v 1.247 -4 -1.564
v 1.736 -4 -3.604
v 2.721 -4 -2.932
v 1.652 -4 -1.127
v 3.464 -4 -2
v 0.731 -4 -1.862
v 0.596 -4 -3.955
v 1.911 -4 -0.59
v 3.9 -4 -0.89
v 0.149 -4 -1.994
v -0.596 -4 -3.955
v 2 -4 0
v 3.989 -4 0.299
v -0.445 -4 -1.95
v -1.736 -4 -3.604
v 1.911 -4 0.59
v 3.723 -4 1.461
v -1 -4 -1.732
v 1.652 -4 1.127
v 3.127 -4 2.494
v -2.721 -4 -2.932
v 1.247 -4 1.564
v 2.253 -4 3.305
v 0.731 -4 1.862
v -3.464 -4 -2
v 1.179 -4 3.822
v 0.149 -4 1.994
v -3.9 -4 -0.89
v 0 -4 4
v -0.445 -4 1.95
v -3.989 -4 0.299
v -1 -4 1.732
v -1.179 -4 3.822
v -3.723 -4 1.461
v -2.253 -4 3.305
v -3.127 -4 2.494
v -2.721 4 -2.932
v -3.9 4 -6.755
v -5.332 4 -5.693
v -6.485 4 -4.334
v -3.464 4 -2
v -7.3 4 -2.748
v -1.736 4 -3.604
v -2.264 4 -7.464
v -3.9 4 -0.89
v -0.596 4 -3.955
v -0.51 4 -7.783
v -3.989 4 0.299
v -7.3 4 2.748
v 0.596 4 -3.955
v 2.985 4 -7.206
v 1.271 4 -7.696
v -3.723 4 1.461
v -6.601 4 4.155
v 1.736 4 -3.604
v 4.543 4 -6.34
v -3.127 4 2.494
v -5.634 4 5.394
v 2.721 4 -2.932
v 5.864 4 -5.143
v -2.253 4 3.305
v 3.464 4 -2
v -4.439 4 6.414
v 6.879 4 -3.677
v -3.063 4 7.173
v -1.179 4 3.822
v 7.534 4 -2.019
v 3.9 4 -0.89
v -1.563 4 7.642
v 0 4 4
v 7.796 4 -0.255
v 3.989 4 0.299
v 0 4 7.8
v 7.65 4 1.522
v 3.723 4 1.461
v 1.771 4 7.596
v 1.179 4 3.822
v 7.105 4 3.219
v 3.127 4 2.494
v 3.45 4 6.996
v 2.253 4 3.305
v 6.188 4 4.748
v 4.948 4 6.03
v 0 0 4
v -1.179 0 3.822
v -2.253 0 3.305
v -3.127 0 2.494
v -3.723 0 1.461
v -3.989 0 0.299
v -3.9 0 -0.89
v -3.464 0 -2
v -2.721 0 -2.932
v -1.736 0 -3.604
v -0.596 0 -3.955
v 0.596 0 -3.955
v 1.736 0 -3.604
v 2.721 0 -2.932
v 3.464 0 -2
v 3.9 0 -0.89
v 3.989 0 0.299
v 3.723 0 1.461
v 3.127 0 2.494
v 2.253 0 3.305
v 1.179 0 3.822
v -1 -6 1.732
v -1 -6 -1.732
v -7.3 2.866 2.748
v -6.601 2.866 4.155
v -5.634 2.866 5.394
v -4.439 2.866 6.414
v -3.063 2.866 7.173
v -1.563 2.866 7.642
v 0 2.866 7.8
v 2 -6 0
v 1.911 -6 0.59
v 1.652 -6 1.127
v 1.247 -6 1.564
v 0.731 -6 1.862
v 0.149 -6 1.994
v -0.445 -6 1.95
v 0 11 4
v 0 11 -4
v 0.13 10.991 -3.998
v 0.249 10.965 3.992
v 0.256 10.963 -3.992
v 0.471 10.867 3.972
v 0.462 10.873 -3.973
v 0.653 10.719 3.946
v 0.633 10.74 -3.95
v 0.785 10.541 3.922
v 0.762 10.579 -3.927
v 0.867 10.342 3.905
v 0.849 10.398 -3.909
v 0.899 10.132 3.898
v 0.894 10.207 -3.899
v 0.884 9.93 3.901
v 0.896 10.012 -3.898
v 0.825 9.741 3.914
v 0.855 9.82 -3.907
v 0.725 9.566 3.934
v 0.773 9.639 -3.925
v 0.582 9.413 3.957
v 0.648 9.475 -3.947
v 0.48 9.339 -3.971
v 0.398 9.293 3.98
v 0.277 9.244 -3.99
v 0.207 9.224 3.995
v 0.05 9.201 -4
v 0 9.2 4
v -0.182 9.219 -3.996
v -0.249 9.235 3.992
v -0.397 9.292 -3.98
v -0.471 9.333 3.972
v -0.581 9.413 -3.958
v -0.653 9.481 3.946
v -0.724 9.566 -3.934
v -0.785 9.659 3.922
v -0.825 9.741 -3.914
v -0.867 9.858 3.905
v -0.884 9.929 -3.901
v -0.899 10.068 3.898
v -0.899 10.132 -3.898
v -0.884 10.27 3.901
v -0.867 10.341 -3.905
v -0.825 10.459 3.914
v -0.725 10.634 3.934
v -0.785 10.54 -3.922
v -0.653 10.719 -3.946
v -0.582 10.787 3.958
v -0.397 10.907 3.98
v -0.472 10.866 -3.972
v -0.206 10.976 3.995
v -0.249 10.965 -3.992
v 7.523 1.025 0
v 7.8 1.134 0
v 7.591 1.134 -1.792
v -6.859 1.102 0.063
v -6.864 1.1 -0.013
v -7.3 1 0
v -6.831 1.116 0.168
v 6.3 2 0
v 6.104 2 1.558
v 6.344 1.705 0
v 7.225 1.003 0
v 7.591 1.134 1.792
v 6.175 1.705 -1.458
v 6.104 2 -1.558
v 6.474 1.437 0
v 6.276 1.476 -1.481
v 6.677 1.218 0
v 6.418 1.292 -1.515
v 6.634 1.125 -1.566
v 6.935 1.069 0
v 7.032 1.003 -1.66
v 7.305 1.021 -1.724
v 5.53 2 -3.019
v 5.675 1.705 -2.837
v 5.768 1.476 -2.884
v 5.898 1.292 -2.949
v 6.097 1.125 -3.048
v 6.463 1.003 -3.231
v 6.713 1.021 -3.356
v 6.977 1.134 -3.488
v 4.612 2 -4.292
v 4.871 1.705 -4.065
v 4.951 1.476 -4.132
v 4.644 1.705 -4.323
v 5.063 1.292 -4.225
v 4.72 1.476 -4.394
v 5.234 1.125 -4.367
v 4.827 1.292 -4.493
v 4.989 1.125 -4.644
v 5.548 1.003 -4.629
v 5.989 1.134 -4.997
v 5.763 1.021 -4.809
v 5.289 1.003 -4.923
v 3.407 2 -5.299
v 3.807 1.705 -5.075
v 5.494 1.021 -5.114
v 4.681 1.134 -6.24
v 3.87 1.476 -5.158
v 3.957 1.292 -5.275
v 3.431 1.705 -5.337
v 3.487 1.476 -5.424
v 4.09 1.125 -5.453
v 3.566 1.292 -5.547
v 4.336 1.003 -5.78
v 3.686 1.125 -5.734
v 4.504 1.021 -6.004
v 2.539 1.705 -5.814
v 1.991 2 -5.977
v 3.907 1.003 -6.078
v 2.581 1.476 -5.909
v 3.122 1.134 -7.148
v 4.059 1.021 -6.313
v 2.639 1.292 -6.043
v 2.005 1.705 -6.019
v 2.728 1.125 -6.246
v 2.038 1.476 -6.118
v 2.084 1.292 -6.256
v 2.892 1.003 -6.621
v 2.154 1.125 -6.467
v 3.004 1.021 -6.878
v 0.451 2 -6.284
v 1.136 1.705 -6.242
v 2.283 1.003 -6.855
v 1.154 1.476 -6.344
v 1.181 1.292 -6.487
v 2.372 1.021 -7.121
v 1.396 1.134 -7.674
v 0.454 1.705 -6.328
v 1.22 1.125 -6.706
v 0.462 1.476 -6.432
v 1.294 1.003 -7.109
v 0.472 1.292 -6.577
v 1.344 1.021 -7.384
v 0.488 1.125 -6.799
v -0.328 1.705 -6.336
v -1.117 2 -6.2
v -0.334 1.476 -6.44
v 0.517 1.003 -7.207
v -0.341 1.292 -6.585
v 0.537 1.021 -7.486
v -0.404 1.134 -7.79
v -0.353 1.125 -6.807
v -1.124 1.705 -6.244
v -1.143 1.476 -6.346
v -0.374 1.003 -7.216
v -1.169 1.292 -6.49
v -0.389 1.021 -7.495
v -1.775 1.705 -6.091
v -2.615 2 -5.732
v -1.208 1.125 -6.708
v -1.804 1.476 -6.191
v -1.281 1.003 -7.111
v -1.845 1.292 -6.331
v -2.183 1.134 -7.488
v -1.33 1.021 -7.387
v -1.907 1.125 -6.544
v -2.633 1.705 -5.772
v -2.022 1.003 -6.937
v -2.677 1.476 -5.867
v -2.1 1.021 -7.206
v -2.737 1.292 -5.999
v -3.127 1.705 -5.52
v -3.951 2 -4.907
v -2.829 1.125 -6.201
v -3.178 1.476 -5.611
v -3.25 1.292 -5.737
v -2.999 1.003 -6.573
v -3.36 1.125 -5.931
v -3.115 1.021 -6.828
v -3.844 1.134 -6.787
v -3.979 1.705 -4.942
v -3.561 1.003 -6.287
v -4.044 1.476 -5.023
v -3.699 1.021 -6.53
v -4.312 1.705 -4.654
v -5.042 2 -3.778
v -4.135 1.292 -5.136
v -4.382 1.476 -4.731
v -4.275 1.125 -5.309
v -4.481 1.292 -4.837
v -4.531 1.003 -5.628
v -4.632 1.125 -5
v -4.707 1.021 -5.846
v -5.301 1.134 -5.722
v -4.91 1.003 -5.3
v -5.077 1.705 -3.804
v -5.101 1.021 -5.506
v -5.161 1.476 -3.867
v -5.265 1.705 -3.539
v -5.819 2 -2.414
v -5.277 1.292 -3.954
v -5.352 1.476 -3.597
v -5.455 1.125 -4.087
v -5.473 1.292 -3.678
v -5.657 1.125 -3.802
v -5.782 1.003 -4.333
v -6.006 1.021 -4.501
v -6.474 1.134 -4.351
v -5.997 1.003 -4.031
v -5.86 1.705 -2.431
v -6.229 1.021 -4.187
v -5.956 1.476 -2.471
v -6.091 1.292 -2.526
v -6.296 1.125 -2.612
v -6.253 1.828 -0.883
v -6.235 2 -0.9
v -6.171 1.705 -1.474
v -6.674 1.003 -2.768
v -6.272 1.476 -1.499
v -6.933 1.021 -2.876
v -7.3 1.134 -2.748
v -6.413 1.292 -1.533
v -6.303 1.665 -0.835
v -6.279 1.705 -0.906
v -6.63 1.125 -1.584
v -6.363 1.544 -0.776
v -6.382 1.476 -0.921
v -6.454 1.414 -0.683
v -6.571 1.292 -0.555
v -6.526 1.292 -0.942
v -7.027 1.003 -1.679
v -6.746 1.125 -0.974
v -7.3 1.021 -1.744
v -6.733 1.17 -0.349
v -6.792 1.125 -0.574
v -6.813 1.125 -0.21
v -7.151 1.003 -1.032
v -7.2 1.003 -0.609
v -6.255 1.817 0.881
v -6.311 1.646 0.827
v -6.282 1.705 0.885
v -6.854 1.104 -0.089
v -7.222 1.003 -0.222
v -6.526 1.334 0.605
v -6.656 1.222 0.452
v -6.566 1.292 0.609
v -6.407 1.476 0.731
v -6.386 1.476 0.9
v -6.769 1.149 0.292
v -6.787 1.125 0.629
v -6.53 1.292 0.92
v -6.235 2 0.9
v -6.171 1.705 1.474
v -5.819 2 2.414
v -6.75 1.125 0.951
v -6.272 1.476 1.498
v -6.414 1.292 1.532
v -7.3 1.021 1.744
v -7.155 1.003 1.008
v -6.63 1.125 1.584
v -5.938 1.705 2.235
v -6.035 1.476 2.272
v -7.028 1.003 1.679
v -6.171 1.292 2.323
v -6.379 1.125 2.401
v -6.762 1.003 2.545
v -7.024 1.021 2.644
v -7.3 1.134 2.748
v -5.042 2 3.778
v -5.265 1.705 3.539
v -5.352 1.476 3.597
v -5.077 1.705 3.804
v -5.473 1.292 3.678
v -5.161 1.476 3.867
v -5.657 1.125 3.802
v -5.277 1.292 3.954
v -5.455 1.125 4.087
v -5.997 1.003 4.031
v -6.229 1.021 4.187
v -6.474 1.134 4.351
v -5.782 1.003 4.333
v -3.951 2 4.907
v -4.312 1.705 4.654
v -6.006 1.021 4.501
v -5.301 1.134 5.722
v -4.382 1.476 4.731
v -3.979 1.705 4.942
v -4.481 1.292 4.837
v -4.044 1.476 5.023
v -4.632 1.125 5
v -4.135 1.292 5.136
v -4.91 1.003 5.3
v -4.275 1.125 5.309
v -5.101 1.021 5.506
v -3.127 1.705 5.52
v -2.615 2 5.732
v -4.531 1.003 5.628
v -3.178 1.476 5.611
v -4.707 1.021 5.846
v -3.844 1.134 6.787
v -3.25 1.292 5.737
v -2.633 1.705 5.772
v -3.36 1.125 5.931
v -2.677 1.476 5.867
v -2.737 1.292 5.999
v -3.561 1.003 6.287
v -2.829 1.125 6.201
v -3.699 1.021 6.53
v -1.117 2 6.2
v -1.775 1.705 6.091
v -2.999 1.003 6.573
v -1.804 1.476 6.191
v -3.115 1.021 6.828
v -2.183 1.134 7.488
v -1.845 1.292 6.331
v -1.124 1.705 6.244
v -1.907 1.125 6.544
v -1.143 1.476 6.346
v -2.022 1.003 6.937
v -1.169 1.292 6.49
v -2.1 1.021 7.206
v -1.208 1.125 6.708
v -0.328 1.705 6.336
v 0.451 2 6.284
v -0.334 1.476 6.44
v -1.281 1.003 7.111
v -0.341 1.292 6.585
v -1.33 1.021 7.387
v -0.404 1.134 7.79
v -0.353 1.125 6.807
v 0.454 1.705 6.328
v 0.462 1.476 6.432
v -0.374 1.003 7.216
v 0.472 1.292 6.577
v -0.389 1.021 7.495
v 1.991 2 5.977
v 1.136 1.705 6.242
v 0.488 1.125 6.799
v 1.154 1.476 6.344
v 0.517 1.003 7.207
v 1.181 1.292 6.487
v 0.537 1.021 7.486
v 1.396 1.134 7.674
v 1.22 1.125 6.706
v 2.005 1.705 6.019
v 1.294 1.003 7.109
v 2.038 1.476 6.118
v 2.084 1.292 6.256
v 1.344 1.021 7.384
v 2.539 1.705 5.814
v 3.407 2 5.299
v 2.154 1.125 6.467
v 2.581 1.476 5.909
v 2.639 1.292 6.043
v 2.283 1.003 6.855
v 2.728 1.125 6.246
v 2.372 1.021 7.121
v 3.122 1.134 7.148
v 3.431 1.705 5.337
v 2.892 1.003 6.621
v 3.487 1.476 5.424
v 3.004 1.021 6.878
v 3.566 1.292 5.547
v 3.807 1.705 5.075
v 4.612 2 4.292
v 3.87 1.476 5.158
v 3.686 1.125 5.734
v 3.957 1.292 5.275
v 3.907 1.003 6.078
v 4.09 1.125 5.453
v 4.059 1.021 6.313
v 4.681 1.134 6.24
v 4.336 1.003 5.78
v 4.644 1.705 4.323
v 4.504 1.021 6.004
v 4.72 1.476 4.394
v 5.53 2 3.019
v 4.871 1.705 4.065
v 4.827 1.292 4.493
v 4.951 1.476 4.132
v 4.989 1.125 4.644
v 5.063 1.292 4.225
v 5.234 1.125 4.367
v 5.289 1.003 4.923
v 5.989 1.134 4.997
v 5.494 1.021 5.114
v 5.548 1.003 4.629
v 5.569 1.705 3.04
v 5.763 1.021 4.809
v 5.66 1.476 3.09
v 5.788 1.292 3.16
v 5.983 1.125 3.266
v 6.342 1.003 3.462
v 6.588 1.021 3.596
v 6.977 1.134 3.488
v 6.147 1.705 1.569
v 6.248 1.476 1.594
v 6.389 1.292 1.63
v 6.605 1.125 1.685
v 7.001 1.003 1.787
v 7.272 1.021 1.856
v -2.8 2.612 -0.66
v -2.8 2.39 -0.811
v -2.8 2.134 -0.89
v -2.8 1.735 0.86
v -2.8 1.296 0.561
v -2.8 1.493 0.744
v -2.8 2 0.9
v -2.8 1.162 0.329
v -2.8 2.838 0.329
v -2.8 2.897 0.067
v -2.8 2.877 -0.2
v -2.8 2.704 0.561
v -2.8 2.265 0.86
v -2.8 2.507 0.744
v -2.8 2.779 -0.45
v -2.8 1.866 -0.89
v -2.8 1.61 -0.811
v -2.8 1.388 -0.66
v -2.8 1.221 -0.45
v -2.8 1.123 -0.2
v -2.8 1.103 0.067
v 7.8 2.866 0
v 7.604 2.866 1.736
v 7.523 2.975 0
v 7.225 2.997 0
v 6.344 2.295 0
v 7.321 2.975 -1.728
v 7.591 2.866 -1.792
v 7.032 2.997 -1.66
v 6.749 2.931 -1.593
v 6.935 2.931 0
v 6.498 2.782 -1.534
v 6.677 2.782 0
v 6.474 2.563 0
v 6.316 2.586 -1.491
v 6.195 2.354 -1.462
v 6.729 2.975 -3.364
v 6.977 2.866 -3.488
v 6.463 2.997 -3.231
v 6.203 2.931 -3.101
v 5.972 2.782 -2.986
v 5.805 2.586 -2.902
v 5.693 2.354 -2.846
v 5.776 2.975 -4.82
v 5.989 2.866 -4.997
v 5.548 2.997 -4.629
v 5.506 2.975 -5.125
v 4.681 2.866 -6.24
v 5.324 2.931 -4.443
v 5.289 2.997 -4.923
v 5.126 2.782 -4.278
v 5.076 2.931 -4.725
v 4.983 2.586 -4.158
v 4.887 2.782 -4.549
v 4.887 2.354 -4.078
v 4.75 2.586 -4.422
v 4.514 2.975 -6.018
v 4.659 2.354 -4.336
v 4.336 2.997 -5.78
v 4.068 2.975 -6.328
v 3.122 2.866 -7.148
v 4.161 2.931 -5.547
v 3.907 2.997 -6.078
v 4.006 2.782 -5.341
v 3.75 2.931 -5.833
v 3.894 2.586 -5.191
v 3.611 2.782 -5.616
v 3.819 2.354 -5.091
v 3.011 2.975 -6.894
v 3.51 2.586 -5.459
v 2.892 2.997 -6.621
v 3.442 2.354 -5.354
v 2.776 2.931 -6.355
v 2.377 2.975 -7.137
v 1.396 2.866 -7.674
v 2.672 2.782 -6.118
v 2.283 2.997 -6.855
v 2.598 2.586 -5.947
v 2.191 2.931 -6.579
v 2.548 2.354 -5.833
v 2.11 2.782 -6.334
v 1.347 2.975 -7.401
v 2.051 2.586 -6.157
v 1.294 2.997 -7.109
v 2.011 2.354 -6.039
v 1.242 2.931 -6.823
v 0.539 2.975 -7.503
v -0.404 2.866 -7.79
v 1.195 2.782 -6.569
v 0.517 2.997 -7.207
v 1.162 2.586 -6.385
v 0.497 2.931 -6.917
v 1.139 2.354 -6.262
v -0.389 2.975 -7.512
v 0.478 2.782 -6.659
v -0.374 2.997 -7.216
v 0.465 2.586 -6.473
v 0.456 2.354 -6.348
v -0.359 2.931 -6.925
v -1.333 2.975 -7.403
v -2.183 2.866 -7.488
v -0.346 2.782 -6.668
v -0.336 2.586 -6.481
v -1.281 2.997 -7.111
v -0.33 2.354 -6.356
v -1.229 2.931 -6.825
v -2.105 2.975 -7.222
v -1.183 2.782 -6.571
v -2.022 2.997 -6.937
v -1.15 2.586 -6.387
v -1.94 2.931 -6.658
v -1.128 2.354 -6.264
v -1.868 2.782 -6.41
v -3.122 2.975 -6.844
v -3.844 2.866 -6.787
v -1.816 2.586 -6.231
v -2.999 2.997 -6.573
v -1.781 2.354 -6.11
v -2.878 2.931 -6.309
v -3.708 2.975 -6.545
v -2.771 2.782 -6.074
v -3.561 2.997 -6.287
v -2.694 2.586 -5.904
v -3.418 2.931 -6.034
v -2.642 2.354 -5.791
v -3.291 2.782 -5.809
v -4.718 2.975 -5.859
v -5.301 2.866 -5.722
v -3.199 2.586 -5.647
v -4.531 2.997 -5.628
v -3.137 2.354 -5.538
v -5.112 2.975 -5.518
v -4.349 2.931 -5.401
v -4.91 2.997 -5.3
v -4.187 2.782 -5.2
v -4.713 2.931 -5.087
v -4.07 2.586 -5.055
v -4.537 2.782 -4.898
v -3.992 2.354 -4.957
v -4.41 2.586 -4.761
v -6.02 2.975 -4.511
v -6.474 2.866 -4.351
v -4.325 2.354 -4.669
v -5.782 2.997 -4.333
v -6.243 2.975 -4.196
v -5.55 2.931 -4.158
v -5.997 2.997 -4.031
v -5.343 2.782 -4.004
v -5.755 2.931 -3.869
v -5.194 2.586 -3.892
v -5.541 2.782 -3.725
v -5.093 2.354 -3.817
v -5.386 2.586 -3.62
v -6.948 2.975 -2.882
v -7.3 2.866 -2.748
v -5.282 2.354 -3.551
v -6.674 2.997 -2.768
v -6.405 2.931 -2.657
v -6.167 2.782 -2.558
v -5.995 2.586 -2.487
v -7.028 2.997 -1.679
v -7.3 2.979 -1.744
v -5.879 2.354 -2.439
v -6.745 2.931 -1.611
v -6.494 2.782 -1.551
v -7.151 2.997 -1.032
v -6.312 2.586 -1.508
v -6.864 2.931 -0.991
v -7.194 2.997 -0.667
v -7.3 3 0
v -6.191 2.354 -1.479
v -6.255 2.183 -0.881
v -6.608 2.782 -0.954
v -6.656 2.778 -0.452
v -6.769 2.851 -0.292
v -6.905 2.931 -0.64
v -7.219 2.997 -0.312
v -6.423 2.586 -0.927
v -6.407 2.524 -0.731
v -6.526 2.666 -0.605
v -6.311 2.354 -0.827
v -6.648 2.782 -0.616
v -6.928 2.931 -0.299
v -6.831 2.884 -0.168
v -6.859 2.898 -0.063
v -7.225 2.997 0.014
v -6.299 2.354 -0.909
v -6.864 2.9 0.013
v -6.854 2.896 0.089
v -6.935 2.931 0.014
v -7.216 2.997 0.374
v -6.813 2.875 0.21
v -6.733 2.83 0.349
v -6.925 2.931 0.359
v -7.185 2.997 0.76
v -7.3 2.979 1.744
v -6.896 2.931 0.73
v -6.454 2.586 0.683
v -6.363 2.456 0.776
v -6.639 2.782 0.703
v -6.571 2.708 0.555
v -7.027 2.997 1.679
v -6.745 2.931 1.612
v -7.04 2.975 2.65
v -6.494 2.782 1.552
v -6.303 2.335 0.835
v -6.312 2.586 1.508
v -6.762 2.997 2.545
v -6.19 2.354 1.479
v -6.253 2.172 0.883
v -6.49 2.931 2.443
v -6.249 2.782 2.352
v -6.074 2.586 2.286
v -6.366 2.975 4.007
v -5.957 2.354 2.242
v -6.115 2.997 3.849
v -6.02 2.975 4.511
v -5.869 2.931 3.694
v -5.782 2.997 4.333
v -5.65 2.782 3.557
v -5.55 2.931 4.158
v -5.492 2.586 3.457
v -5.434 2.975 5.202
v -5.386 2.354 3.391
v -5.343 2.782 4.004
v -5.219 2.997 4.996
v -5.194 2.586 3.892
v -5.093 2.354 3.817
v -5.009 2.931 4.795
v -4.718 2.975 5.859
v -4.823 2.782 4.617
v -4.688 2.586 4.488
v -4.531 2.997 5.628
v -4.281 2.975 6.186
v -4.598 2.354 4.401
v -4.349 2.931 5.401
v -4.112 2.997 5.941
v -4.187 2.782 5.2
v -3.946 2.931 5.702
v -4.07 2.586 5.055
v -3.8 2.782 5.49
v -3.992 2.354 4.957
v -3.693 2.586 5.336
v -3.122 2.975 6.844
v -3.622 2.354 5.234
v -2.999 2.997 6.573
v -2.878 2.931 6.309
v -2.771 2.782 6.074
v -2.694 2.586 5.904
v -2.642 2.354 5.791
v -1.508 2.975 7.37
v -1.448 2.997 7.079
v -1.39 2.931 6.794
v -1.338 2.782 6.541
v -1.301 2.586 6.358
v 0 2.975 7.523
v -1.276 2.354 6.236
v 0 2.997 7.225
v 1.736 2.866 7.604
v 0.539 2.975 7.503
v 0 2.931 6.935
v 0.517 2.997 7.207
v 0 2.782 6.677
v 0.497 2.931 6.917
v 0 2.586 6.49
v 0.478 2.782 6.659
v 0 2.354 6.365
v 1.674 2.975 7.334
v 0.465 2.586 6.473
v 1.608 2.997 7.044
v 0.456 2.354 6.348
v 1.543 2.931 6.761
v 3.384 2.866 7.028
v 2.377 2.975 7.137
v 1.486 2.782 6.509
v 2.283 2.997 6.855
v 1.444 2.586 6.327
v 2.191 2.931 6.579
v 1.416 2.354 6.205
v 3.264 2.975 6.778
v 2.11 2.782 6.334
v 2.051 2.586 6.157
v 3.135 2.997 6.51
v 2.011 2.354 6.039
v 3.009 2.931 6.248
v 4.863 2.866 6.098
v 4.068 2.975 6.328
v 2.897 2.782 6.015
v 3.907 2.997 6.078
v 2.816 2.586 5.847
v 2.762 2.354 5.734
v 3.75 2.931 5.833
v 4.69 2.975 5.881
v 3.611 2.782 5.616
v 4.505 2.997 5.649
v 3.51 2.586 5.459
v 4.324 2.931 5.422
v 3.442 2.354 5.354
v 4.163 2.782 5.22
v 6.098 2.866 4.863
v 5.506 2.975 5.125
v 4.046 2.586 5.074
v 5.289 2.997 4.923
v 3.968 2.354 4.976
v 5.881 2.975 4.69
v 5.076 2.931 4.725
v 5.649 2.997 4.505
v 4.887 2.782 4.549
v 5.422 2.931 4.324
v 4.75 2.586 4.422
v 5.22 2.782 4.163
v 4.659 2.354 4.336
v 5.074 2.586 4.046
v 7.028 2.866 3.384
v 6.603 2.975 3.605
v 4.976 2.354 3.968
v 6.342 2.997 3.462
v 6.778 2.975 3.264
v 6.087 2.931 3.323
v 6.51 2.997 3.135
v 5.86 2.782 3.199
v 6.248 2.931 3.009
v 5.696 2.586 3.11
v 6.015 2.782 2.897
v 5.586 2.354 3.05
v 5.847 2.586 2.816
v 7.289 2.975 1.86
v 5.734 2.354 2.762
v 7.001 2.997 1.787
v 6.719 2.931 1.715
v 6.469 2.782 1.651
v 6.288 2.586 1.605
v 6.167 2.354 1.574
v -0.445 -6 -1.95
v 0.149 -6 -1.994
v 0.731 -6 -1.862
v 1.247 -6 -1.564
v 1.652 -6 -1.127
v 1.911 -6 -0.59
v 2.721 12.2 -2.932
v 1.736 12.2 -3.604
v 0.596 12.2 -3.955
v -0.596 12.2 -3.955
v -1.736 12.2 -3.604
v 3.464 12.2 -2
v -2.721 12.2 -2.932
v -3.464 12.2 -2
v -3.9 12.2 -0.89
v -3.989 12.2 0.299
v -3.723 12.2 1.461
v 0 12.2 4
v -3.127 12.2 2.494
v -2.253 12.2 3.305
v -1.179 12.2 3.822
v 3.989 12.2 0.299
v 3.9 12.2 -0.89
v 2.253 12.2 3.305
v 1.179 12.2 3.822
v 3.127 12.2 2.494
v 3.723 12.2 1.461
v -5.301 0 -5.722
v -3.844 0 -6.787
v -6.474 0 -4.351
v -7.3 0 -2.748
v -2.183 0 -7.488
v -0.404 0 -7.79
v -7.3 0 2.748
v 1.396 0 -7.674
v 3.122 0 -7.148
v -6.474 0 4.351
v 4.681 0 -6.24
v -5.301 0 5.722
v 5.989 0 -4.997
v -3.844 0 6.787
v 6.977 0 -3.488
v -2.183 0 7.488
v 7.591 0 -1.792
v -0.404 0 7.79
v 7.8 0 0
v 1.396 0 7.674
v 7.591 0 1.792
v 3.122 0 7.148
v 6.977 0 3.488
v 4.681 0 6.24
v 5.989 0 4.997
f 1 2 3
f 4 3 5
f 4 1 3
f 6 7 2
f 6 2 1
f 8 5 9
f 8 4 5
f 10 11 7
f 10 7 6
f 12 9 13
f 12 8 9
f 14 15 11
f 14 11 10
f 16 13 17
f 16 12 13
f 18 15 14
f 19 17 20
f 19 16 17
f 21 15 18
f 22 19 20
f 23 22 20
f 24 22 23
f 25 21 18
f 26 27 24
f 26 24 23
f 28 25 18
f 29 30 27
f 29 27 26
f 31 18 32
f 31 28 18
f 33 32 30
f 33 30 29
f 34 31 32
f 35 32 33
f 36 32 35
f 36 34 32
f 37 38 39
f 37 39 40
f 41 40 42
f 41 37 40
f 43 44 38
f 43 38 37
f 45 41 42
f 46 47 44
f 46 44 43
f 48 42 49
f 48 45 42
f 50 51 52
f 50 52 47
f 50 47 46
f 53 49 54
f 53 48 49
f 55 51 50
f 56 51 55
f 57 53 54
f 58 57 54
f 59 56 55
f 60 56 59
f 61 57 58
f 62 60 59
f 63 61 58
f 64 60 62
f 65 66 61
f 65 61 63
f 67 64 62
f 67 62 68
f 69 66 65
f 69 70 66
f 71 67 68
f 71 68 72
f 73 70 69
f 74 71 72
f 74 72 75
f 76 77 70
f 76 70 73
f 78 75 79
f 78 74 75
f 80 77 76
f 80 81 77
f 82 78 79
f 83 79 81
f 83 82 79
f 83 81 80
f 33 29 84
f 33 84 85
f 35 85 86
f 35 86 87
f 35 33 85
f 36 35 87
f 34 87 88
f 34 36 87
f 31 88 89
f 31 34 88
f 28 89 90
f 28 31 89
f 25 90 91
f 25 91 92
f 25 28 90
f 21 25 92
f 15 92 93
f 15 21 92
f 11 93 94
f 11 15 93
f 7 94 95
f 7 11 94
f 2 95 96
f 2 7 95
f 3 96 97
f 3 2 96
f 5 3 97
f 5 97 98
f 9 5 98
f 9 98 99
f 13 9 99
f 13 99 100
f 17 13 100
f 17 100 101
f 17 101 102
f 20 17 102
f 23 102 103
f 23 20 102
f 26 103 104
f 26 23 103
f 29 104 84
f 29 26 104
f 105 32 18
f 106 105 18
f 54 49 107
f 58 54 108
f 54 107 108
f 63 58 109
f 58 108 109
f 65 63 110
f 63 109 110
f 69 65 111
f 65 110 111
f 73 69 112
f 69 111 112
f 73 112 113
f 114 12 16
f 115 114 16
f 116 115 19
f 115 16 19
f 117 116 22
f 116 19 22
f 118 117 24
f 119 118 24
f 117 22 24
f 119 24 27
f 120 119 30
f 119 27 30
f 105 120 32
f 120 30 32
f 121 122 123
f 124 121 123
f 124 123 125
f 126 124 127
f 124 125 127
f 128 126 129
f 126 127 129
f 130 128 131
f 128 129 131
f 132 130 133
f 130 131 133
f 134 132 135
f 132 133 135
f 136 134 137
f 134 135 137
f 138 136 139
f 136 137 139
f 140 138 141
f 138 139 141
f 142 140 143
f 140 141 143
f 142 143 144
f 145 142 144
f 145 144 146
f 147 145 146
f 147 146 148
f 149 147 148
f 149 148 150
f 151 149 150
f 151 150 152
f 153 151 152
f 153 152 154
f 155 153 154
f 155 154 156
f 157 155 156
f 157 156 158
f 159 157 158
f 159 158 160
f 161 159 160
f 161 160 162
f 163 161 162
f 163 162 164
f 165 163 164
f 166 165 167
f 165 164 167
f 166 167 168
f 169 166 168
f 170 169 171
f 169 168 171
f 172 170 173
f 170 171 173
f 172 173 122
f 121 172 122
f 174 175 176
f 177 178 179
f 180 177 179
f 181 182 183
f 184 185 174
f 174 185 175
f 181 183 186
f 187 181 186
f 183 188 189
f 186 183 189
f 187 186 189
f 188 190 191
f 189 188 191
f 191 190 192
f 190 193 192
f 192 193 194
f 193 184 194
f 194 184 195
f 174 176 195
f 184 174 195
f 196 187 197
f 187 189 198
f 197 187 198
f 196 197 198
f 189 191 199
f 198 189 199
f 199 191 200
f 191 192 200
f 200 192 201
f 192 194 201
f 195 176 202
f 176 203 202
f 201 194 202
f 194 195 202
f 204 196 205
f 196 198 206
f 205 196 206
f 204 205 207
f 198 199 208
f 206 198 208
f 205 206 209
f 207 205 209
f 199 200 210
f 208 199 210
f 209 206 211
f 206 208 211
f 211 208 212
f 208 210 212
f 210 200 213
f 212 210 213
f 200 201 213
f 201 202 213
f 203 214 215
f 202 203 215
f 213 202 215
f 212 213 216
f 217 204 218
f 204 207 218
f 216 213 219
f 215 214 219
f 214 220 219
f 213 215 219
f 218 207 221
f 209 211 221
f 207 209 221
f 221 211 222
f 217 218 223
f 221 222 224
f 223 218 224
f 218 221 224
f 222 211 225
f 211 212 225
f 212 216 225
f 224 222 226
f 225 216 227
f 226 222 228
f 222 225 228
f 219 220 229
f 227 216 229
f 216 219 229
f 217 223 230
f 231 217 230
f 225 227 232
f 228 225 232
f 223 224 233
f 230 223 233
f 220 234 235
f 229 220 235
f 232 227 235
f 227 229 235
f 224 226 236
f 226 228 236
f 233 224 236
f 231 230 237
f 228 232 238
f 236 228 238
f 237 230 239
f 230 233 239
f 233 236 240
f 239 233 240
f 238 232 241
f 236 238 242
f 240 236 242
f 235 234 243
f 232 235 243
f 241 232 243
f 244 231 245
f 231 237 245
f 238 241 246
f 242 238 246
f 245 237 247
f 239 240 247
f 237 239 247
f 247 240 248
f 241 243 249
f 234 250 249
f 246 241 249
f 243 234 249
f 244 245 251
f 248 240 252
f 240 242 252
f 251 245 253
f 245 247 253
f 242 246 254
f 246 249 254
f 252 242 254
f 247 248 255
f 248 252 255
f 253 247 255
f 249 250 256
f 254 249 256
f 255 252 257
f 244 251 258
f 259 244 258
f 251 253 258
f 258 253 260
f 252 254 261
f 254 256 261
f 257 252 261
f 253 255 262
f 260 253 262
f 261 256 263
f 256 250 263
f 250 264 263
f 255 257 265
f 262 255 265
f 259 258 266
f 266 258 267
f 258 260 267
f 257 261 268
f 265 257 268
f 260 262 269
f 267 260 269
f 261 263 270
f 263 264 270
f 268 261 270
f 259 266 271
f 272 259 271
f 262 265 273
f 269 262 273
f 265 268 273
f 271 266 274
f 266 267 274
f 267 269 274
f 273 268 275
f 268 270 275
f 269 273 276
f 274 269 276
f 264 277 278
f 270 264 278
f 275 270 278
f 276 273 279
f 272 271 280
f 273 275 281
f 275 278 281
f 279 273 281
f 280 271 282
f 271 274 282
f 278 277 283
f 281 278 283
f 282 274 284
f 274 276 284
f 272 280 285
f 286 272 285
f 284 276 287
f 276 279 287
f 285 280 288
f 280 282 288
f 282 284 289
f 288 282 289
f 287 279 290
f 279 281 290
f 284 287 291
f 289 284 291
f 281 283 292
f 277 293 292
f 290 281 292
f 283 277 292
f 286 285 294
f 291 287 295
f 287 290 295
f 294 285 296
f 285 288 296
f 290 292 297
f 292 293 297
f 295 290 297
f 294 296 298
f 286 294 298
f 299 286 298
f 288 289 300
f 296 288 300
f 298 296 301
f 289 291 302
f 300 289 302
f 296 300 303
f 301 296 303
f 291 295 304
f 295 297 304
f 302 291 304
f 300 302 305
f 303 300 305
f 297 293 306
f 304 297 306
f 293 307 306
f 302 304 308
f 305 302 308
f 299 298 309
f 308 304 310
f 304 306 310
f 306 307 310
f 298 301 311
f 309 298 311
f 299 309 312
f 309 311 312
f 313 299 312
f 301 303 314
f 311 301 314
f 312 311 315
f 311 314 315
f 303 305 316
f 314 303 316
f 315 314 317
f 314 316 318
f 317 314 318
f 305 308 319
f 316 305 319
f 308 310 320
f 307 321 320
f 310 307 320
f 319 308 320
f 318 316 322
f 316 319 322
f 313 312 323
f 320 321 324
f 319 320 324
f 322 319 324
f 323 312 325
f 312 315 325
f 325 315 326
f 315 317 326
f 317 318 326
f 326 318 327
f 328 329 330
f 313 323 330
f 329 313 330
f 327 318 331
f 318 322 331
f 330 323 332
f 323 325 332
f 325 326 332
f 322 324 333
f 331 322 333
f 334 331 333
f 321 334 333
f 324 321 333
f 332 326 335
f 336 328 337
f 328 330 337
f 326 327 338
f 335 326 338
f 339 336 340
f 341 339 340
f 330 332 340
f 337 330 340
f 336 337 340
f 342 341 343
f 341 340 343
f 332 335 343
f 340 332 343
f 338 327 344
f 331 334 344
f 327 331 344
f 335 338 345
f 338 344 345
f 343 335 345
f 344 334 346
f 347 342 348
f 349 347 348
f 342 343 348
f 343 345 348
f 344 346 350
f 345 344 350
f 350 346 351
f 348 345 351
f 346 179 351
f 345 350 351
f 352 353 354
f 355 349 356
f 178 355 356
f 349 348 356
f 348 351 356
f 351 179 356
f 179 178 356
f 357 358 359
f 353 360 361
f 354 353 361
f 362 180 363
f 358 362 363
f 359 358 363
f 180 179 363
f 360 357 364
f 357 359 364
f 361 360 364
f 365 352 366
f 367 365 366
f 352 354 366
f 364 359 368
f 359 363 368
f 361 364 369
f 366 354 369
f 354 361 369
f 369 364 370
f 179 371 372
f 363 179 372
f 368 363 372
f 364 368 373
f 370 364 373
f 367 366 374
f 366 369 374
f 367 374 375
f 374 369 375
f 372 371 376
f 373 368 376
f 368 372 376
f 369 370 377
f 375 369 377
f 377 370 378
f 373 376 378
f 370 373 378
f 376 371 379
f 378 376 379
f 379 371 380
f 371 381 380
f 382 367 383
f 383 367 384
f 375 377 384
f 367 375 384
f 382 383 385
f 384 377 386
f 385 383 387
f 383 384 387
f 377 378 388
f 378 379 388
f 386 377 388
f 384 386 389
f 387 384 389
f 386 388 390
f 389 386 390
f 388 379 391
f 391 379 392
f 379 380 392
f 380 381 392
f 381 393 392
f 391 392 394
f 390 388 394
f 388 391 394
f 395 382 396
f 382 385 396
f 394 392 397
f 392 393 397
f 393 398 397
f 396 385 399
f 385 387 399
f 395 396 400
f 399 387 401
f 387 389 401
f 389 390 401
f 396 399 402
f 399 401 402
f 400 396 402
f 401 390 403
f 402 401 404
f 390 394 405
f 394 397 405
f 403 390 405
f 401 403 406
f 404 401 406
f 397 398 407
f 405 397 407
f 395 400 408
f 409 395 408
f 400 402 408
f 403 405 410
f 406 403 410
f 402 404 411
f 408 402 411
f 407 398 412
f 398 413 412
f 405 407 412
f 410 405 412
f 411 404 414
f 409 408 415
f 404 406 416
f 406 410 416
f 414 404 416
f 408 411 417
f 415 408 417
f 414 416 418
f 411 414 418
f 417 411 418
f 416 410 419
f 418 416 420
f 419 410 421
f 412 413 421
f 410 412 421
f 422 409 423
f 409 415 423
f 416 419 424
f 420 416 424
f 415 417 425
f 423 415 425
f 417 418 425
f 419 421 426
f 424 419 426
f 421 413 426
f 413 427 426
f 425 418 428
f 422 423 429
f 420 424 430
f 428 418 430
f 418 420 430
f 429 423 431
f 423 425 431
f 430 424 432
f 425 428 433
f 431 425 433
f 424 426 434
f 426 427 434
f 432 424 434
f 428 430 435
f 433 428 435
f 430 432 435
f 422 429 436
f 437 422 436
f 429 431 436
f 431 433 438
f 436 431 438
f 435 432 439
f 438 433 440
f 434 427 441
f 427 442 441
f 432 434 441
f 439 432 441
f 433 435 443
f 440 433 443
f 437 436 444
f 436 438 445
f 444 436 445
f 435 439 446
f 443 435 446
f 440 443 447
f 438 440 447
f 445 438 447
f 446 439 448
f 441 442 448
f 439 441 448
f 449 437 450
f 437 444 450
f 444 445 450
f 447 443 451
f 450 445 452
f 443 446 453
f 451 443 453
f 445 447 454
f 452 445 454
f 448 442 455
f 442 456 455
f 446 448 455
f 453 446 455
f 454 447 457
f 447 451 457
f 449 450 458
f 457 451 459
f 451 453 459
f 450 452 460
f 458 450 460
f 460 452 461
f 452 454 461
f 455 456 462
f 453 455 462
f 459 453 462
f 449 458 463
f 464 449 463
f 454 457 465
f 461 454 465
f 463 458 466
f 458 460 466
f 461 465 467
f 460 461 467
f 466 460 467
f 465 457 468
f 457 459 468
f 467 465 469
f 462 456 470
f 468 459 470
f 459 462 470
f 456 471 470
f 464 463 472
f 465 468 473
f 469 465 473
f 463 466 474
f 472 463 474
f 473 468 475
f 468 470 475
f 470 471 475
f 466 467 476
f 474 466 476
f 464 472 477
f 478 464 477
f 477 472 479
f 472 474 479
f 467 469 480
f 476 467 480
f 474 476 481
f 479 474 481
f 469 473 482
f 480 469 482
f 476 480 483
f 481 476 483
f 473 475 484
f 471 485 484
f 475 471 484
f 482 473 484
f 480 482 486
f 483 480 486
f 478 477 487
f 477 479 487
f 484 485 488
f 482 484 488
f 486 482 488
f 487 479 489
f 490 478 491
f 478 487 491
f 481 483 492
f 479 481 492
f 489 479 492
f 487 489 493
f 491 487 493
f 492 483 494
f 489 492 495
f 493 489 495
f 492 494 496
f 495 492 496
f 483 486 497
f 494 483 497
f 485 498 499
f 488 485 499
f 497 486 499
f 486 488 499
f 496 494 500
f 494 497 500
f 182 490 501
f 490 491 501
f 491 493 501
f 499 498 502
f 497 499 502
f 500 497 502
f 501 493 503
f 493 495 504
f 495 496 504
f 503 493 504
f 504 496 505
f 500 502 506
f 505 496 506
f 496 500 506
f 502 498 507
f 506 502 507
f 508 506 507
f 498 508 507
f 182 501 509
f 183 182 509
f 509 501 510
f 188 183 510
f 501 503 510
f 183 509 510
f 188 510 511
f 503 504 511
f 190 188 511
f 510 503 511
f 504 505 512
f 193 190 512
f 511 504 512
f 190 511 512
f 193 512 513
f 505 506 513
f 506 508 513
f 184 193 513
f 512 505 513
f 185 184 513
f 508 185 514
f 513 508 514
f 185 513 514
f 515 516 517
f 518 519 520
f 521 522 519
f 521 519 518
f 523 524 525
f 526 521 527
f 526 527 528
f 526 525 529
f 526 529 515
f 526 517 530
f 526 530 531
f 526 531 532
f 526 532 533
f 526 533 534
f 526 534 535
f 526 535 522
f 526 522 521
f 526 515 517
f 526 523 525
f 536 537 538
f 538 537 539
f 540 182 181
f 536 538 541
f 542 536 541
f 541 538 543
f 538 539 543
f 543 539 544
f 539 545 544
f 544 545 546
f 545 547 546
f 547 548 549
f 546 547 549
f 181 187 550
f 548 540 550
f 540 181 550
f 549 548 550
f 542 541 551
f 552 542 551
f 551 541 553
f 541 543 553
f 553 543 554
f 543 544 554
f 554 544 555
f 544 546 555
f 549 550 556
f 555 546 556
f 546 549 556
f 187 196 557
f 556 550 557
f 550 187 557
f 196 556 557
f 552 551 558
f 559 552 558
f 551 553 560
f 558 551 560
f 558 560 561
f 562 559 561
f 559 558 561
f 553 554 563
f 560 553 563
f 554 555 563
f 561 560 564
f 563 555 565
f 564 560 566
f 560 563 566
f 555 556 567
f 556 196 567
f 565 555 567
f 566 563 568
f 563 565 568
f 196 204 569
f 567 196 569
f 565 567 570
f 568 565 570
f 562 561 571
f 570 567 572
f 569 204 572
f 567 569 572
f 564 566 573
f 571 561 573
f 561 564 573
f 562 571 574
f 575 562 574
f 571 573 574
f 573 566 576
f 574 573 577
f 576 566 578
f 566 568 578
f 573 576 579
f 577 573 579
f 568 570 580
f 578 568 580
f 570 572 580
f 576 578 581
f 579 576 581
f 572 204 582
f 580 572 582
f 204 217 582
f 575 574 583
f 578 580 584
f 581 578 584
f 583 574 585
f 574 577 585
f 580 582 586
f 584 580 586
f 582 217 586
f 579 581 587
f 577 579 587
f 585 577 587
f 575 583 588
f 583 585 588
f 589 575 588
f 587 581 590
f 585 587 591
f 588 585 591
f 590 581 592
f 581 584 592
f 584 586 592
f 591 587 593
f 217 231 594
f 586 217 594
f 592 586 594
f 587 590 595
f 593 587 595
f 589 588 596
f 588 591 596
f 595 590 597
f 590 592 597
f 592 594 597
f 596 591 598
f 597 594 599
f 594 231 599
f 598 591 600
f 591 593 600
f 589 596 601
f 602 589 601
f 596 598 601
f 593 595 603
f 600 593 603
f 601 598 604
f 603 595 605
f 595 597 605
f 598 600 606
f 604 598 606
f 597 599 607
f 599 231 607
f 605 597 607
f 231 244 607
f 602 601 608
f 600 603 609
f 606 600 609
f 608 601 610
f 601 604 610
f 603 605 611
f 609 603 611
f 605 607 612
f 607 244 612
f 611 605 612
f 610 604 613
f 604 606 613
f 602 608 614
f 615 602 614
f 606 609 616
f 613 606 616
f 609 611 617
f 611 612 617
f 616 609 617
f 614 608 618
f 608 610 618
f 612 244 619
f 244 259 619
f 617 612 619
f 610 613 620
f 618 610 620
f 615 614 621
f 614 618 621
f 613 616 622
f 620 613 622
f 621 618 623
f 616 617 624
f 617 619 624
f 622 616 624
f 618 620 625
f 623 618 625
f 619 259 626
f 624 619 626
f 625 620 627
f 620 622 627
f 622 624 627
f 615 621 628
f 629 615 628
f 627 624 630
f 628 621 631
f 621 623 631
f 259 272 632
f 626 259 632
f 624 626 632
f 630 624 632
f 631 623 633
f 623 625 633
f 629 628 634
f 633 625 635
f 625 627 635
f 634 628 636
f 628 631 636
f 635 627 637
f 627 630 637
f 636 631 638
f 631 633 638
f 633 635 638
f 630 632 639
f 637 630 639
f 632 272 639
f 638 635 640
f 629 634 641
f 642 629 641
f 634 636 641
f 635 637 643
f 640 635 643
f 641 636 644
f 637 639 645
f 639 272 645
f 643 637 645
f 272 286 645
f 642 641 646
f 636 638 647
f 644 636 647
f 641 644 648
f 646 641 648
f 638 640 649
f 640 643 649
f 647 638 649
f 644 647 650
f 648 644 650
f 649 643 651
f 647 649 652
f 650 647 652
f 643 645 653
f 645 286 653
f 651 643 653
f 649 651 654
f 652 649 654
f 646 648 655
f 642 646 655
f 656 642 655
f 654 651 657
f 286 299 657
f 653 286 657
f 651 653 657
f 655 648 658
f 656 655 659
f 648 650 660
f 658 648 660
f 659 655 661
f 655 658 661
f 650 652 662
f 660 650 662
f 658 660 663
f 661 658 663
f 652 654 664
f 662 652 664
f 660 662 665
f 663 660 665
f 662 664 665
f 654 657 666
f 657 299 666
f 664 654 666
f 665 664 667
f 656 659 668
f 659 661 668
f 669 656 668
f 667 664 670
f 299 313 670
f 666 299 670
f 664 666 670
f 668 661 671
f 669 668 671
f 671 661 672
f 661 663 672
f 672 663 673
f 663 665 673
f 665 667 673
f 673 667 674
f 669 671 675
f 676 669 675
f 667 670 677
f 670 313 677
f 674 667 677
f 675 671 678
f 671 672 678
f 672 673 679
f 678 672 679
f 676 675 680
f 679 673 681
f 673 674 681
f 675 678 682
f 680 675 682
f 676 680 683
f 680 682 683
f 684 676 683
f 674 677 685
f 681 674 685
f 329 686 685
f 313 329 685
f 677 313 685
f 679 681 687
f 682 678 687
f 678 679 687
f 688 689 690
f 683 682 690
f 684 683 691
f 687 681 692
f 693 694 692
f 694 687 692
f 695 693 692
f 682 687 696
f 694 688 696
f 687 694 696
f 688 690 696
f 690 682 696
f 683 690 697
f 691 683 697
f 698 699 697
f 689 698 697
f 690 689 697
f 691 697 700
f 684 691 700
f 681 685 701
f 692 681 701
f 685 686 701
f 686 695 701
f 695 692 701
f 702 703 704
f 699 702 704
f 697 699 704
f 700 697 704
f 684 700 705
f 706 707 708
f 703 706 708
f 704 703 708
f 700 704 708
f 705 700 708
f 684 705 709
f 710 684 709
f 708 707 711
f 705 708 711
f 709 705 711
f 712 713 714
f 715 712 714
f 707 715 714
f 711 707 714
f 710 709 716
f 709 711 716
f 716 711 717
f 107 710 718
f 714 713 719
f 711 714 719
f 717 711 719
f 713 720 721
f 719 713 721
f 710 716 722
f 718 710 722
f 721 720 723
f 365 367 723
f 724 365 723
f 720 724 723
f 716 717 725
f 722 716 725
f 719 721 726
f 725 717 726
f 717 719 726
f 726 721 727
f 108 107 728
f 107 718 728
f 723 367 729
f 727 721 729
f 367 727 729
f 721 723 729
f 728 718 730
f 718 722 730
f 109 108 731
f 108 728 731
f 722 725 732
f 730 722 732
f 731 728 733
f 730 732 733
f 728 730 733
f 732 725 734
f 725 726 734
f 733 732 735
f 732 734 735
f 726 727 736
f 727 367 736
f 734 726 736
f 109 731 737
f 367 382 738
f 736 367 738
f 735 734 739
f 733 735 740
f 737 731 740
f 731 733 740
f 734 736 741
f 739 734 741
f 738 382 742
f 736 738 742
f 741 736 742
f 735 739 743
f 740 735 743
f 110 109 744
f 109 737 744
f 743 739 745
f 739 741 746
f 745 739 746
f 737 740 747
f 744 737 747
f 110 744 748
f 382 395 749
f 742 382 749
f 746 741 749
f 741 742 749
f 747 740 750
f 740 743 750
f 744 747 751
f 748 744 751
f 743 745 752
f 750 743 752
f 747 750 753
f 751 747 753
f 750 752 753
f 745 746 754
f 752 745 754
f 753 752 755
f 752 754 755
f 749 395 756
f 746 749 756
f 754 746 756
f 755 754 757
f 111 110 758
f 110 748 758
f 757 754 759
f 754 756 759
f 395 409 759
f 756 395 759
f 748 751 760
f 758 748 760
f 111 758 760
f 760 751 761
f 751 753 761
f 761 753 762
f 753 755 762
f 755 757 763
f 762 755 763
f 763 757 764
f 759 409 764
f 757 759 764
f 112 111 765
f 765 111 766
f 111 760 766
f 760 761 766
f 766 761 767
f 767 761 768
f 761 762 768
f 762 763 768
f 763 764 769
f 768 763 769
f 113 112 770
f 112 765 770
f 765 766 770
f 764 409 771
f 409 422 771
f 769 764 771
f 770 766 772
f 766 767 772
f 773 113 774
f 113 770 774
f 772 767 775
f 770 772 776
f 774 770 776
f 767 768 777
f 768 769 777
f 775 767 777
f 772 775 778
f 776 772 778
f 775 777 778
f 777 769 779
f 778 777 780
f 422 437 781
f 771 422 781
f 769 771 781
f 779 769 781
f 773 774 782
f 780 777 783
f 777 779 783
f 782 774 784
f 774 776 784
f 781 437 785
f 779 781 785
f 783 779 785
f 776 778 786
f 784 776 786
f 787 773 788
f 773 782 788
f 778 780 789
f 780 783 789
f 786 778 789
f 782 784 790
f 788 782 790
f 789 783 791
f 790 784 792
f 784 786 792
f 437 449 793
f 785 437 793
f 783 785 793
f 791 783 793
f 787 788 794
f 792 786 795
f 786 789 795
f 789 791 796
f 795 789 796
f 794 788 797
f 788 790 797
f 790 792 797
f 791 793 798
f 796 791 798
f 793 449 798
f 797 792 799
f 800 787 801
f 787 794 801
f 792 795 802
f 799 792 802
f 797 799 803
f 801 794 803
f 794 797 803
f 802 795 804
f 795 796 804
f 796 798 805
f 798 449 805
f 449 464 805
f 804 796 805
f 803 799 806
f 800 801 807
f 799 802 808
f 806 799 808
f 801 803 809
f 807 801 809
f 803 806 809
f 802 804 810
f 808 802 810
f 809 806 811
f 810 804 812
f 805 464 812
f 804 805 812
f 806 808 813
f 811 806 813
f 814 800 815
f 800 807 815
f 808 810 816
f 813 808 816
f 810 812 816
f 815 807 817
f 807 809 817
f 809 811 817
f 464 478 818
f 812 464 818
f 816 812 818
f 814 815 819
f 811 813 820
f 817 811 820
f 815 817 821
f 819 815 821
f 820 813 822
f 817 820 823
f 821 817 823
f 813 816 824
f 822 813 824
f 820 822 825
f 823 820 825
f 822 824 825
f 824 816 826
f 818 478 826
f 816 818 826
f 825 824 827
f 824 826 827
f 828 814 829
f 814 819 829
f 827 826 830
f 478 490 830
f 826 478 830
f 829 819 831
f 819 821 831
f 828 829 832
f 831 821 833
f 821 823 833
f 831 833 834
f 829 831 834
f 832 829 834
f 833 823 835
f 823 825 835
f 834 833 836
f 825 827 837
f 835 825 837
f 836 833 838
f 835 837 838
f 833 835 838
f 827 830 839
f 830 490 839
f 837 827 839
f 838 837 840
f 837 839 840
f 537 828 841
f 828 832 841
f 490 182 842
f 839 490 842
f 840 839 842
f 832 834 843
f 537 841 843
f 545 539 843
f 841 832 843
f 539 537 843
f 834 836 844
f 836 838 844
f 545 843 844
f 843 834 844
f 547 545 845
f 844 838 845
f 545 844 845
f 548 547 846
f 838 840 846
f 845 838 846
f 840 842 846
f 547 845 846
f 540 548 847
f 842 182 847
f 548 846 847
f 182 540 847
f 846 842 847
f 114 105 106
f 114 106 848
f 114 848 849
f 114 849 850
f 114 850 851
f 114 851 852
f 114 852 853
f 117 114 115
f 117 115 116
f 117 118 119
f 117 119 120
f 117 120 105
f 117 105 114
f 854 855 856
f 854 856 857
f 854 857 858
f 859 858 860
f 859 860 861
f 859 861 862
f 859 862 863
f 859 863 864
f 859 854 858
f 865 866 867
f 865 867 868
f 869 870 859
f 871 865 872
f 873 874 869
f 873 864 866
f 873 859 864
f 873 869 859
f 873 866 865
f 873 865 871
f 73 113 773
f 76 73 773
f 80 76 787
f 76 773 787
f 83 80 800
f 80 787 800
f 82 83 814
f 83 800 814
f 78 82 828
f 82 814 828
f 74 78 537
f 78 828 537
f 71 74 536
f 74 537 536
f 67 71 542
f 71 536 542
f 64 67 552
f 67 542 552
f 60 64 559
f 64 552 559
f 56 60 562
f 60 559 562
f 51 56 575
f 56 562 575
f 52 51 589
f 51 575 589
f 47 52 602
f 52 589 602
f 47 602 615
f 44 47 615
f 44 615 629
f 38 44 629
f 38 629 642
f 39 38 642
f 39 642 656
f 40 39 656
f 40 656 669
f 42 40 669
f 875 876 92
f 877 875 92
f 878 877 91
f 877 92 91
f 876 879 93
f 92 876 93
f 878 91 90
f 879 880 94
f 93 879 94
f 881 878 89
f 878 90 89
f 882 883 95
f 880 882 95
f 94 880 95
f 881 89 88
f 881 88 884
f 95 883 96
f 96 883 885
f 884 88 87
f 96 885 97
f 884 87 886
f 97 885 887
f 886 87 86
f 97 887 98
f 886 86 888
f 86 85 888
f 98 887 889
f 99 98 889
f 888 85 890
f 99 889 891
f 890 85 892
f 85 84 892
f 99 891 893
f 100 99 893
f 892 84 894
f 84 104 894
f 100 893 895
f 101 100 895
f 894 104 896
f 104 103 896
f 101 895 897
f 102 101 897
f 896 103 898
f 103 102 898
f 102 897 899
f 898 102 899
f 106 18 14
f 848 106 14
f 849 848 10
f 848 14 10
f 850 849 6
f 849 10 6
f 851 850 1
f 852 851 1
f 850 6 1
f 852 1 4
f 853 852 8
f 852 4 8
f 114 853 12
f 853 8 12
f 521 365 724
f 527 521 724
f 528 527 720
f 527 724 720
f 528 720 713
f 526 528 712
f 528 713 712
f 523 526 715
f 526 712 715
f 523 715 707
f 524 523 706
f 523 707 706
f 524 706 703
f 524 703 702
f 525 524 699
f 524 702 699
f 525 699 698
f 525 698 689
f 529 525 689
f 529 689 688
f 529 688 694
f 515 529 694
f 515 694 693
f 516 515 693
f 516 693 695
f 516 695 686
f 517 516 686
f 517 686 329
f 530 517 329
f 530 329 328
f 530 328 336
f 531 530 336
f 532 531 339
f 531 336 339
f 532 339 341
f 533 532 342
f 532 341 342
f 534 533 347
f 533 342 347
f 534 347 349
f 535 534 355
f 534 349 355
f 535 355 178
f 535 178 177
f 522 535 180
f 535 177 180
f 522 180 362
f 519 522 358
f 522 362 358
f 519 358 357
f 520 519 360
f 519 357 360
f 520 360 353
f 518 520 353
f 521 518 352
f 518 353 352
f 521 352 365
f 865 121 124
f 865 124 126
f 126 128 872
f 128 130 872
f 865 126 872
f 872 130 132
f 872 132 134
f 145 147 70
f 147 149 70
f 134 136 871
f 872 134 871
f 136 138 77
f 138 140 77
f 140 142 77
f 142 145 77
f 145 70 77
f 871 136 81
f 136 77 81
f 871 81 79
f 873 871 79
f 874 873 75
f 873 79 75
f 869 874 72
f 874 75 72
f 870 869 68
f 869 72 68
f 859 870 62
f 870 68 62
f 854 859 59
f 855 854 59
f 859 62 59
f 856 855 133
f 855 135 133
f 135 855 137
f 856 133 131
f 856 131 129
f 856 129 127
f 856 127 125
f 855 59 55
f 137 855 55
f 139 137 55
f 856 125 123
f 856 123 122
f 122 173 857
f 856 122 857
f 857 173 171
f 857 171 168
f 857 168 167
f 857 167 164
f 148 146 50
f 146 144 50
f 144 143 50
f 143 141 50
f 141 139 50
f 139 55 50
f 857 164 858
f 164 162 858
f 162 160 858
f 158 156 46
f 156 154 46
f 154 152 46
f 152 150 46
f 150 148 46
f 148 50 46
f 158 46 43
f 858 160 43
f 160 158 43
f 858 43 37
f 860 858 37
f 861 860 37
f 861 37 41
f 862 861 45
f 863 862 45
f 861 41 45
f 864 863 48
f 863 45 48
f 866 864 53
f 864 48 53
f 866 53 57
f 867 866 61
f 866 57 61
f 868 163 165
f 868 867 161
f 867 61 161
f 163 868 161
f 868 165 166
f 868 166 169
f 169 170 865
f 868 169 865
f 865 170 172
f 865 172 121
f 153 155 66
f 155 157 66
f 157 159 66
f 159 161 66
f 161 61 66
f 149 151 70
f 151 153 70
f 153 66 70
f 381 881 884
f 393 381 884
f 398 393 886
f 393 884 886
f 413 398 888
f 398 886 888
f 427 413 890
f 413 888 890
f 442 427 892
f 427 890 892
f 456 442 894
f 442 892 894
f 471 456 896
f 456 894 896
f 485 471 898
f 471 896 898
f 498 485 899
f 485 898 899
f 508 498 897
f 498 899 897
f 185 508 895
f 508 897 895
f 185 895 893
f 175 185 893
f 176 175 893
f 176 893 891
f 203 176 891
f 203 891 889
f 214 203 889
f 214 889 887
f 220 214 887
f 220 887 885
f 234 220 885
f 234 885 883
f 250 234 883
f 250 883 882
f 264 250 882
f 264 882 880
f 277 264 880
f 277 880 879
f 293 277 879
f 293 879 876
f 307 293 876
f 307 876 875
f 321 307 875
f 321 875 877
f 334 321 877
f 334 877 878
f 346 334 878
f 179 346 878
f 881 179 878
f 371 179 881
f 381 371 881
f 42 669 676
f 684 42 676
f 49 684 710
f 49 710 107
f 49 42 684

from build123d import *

# Parameters (mm, degrees)
SKETCH_1_R          = 7.8
EXTRUDE_1_DEPTH     = 4
SKETCH_2_R          = 4
EXTRUDE_2_DEPTH     = 8.2
SWEEP_1_PROFILE_R   = 1
SKETCH_10_R         = 0.9
CUT_EXTRUDE_3_DEPTH = 19.679400419
EXTRUDE_START       = 4
SKETCH_12_R         = 4
EXTRUDE_3_DEPTH     = 4
EXTRUDE_4_DEPTH     = 2
SKETCH_14_R         = 0.9
CUT_EXTRUDE_4_DEPTH = 5
SKETCH_15_W         = 7.770297698
SKETCH_15_H         = 4
CUT_EXTRUDE_5_DEPTH = 0.5


with BuildPart() as part:
    # 草图1 → 凸台-拉伸1 (new body)
    with BuildSketch(Plane(origin=(0, 0, 0), x_dir=(1, 0, 0), z_dir=(0, 1, 0))):
        with Locations(Location((0, 0, 0), (0, 0, 270))):
            Circle(SKETCH_1_R)
    extrude(amount=EXTRUDE_1_DEPTH)

    # 草图2 → 凸台-拉伸2 (add)
    with BuildSketch(Plane(origin=(0, 4, 0), x_dir=(1, 0, 0), z_dir=(0, 1, 0))):
        with Locations(Location((0, 0, 0), (0, 0, 270))):
            Circle(SKETCH_2_R)
    extrude(amount=EXTRUDE_2_DEPTH)

    # 切除-扫描1: sweep along a path in 草图5
    with BuildLine(Plane(origin=(0, 2, 0), x_dir=(1, 0, 0), z_dir=(0, 1, 0))) as sweep_1_path:
        CenterArc((0, 0), 7.3, 0, 360)
    # 切除-扫描1 profile (on start of the path) → 切除-扫描1 (sweep, cut)
    with BuildSketch(Plane(origin=(7.3, 2, 0), x_dir=(-1, 0, 0), z_dir=(0, 0, -1))):
        Circle(SWEEP_1_PROFILE_R)
    sweep(path=sweep_1_path.line, mode=Mode.SUBTRACT)

    # 草图10 → 切除-拉伸3 (cut, through all)
    with BuildSketch(Plane(origin=(0, 0, -4), x_dir=(-1, 0, 0), z_dir=(0, 0, -1))):
        with Locations(Location((0, 10.1, 0), (0, 0, 89.999999955))):
            Circle(SKETCH_10_R)
    extrude(amount=-CUT_EXTRUDE_3_DEPTH, mode=Mode.SUBTRACT)

    # 草图12 → 凸台-拉伸3 (add)
    with BuildSketch(Plane.XZ.offset(EXTRUDE_START)):
        with Locations(Location((0, 0, 0), (0, 0, 90))):
            Circle(SKETCH_12_R)
    extrude(amount=-EXTRUDE_3_DEPTH)

    # 草图13 → 凸台-拉伸4 (add)
    with BuildSketch(Plane.XZ.offset(4)):
        with BuildLine():
            ThreePointArc((2, 0), (1, 1.732050808), (-1, 1.732050808))
            Line((-1, 1.732050808), (-1, -1.732050808))
            ThreePointArc((-1, -1.732050808), (1, -1.732050808), (2, 0))
        make_face()
    extrude(amount=EXTRUDE_4_DEPTH)

    # 草图14 → 切除-拉伸4 (cut)
    with BuildSketch(Plane.ZY.offset(7.8)):
        with Locations((0, 2)):
            Circle(SKETCH_14_R)
    extrude(amount=-CUT_EXTRUDE_4_DEPTH, mode=Mode.SUBTRACT)

    # 草图15 → 切除-拉伸5 (cut)
    with BuildSketch(Plane.ZY.offset(7.8)):
        with Locations((0.165386451, 2)):
            Rectangle(SKETCH_15_W, SKETCH_15_H)
    extrude(amount=-CUT_EXTRUDE_5_DEPTH, mode=Mode.SUBTRACT)


solid = part.part
